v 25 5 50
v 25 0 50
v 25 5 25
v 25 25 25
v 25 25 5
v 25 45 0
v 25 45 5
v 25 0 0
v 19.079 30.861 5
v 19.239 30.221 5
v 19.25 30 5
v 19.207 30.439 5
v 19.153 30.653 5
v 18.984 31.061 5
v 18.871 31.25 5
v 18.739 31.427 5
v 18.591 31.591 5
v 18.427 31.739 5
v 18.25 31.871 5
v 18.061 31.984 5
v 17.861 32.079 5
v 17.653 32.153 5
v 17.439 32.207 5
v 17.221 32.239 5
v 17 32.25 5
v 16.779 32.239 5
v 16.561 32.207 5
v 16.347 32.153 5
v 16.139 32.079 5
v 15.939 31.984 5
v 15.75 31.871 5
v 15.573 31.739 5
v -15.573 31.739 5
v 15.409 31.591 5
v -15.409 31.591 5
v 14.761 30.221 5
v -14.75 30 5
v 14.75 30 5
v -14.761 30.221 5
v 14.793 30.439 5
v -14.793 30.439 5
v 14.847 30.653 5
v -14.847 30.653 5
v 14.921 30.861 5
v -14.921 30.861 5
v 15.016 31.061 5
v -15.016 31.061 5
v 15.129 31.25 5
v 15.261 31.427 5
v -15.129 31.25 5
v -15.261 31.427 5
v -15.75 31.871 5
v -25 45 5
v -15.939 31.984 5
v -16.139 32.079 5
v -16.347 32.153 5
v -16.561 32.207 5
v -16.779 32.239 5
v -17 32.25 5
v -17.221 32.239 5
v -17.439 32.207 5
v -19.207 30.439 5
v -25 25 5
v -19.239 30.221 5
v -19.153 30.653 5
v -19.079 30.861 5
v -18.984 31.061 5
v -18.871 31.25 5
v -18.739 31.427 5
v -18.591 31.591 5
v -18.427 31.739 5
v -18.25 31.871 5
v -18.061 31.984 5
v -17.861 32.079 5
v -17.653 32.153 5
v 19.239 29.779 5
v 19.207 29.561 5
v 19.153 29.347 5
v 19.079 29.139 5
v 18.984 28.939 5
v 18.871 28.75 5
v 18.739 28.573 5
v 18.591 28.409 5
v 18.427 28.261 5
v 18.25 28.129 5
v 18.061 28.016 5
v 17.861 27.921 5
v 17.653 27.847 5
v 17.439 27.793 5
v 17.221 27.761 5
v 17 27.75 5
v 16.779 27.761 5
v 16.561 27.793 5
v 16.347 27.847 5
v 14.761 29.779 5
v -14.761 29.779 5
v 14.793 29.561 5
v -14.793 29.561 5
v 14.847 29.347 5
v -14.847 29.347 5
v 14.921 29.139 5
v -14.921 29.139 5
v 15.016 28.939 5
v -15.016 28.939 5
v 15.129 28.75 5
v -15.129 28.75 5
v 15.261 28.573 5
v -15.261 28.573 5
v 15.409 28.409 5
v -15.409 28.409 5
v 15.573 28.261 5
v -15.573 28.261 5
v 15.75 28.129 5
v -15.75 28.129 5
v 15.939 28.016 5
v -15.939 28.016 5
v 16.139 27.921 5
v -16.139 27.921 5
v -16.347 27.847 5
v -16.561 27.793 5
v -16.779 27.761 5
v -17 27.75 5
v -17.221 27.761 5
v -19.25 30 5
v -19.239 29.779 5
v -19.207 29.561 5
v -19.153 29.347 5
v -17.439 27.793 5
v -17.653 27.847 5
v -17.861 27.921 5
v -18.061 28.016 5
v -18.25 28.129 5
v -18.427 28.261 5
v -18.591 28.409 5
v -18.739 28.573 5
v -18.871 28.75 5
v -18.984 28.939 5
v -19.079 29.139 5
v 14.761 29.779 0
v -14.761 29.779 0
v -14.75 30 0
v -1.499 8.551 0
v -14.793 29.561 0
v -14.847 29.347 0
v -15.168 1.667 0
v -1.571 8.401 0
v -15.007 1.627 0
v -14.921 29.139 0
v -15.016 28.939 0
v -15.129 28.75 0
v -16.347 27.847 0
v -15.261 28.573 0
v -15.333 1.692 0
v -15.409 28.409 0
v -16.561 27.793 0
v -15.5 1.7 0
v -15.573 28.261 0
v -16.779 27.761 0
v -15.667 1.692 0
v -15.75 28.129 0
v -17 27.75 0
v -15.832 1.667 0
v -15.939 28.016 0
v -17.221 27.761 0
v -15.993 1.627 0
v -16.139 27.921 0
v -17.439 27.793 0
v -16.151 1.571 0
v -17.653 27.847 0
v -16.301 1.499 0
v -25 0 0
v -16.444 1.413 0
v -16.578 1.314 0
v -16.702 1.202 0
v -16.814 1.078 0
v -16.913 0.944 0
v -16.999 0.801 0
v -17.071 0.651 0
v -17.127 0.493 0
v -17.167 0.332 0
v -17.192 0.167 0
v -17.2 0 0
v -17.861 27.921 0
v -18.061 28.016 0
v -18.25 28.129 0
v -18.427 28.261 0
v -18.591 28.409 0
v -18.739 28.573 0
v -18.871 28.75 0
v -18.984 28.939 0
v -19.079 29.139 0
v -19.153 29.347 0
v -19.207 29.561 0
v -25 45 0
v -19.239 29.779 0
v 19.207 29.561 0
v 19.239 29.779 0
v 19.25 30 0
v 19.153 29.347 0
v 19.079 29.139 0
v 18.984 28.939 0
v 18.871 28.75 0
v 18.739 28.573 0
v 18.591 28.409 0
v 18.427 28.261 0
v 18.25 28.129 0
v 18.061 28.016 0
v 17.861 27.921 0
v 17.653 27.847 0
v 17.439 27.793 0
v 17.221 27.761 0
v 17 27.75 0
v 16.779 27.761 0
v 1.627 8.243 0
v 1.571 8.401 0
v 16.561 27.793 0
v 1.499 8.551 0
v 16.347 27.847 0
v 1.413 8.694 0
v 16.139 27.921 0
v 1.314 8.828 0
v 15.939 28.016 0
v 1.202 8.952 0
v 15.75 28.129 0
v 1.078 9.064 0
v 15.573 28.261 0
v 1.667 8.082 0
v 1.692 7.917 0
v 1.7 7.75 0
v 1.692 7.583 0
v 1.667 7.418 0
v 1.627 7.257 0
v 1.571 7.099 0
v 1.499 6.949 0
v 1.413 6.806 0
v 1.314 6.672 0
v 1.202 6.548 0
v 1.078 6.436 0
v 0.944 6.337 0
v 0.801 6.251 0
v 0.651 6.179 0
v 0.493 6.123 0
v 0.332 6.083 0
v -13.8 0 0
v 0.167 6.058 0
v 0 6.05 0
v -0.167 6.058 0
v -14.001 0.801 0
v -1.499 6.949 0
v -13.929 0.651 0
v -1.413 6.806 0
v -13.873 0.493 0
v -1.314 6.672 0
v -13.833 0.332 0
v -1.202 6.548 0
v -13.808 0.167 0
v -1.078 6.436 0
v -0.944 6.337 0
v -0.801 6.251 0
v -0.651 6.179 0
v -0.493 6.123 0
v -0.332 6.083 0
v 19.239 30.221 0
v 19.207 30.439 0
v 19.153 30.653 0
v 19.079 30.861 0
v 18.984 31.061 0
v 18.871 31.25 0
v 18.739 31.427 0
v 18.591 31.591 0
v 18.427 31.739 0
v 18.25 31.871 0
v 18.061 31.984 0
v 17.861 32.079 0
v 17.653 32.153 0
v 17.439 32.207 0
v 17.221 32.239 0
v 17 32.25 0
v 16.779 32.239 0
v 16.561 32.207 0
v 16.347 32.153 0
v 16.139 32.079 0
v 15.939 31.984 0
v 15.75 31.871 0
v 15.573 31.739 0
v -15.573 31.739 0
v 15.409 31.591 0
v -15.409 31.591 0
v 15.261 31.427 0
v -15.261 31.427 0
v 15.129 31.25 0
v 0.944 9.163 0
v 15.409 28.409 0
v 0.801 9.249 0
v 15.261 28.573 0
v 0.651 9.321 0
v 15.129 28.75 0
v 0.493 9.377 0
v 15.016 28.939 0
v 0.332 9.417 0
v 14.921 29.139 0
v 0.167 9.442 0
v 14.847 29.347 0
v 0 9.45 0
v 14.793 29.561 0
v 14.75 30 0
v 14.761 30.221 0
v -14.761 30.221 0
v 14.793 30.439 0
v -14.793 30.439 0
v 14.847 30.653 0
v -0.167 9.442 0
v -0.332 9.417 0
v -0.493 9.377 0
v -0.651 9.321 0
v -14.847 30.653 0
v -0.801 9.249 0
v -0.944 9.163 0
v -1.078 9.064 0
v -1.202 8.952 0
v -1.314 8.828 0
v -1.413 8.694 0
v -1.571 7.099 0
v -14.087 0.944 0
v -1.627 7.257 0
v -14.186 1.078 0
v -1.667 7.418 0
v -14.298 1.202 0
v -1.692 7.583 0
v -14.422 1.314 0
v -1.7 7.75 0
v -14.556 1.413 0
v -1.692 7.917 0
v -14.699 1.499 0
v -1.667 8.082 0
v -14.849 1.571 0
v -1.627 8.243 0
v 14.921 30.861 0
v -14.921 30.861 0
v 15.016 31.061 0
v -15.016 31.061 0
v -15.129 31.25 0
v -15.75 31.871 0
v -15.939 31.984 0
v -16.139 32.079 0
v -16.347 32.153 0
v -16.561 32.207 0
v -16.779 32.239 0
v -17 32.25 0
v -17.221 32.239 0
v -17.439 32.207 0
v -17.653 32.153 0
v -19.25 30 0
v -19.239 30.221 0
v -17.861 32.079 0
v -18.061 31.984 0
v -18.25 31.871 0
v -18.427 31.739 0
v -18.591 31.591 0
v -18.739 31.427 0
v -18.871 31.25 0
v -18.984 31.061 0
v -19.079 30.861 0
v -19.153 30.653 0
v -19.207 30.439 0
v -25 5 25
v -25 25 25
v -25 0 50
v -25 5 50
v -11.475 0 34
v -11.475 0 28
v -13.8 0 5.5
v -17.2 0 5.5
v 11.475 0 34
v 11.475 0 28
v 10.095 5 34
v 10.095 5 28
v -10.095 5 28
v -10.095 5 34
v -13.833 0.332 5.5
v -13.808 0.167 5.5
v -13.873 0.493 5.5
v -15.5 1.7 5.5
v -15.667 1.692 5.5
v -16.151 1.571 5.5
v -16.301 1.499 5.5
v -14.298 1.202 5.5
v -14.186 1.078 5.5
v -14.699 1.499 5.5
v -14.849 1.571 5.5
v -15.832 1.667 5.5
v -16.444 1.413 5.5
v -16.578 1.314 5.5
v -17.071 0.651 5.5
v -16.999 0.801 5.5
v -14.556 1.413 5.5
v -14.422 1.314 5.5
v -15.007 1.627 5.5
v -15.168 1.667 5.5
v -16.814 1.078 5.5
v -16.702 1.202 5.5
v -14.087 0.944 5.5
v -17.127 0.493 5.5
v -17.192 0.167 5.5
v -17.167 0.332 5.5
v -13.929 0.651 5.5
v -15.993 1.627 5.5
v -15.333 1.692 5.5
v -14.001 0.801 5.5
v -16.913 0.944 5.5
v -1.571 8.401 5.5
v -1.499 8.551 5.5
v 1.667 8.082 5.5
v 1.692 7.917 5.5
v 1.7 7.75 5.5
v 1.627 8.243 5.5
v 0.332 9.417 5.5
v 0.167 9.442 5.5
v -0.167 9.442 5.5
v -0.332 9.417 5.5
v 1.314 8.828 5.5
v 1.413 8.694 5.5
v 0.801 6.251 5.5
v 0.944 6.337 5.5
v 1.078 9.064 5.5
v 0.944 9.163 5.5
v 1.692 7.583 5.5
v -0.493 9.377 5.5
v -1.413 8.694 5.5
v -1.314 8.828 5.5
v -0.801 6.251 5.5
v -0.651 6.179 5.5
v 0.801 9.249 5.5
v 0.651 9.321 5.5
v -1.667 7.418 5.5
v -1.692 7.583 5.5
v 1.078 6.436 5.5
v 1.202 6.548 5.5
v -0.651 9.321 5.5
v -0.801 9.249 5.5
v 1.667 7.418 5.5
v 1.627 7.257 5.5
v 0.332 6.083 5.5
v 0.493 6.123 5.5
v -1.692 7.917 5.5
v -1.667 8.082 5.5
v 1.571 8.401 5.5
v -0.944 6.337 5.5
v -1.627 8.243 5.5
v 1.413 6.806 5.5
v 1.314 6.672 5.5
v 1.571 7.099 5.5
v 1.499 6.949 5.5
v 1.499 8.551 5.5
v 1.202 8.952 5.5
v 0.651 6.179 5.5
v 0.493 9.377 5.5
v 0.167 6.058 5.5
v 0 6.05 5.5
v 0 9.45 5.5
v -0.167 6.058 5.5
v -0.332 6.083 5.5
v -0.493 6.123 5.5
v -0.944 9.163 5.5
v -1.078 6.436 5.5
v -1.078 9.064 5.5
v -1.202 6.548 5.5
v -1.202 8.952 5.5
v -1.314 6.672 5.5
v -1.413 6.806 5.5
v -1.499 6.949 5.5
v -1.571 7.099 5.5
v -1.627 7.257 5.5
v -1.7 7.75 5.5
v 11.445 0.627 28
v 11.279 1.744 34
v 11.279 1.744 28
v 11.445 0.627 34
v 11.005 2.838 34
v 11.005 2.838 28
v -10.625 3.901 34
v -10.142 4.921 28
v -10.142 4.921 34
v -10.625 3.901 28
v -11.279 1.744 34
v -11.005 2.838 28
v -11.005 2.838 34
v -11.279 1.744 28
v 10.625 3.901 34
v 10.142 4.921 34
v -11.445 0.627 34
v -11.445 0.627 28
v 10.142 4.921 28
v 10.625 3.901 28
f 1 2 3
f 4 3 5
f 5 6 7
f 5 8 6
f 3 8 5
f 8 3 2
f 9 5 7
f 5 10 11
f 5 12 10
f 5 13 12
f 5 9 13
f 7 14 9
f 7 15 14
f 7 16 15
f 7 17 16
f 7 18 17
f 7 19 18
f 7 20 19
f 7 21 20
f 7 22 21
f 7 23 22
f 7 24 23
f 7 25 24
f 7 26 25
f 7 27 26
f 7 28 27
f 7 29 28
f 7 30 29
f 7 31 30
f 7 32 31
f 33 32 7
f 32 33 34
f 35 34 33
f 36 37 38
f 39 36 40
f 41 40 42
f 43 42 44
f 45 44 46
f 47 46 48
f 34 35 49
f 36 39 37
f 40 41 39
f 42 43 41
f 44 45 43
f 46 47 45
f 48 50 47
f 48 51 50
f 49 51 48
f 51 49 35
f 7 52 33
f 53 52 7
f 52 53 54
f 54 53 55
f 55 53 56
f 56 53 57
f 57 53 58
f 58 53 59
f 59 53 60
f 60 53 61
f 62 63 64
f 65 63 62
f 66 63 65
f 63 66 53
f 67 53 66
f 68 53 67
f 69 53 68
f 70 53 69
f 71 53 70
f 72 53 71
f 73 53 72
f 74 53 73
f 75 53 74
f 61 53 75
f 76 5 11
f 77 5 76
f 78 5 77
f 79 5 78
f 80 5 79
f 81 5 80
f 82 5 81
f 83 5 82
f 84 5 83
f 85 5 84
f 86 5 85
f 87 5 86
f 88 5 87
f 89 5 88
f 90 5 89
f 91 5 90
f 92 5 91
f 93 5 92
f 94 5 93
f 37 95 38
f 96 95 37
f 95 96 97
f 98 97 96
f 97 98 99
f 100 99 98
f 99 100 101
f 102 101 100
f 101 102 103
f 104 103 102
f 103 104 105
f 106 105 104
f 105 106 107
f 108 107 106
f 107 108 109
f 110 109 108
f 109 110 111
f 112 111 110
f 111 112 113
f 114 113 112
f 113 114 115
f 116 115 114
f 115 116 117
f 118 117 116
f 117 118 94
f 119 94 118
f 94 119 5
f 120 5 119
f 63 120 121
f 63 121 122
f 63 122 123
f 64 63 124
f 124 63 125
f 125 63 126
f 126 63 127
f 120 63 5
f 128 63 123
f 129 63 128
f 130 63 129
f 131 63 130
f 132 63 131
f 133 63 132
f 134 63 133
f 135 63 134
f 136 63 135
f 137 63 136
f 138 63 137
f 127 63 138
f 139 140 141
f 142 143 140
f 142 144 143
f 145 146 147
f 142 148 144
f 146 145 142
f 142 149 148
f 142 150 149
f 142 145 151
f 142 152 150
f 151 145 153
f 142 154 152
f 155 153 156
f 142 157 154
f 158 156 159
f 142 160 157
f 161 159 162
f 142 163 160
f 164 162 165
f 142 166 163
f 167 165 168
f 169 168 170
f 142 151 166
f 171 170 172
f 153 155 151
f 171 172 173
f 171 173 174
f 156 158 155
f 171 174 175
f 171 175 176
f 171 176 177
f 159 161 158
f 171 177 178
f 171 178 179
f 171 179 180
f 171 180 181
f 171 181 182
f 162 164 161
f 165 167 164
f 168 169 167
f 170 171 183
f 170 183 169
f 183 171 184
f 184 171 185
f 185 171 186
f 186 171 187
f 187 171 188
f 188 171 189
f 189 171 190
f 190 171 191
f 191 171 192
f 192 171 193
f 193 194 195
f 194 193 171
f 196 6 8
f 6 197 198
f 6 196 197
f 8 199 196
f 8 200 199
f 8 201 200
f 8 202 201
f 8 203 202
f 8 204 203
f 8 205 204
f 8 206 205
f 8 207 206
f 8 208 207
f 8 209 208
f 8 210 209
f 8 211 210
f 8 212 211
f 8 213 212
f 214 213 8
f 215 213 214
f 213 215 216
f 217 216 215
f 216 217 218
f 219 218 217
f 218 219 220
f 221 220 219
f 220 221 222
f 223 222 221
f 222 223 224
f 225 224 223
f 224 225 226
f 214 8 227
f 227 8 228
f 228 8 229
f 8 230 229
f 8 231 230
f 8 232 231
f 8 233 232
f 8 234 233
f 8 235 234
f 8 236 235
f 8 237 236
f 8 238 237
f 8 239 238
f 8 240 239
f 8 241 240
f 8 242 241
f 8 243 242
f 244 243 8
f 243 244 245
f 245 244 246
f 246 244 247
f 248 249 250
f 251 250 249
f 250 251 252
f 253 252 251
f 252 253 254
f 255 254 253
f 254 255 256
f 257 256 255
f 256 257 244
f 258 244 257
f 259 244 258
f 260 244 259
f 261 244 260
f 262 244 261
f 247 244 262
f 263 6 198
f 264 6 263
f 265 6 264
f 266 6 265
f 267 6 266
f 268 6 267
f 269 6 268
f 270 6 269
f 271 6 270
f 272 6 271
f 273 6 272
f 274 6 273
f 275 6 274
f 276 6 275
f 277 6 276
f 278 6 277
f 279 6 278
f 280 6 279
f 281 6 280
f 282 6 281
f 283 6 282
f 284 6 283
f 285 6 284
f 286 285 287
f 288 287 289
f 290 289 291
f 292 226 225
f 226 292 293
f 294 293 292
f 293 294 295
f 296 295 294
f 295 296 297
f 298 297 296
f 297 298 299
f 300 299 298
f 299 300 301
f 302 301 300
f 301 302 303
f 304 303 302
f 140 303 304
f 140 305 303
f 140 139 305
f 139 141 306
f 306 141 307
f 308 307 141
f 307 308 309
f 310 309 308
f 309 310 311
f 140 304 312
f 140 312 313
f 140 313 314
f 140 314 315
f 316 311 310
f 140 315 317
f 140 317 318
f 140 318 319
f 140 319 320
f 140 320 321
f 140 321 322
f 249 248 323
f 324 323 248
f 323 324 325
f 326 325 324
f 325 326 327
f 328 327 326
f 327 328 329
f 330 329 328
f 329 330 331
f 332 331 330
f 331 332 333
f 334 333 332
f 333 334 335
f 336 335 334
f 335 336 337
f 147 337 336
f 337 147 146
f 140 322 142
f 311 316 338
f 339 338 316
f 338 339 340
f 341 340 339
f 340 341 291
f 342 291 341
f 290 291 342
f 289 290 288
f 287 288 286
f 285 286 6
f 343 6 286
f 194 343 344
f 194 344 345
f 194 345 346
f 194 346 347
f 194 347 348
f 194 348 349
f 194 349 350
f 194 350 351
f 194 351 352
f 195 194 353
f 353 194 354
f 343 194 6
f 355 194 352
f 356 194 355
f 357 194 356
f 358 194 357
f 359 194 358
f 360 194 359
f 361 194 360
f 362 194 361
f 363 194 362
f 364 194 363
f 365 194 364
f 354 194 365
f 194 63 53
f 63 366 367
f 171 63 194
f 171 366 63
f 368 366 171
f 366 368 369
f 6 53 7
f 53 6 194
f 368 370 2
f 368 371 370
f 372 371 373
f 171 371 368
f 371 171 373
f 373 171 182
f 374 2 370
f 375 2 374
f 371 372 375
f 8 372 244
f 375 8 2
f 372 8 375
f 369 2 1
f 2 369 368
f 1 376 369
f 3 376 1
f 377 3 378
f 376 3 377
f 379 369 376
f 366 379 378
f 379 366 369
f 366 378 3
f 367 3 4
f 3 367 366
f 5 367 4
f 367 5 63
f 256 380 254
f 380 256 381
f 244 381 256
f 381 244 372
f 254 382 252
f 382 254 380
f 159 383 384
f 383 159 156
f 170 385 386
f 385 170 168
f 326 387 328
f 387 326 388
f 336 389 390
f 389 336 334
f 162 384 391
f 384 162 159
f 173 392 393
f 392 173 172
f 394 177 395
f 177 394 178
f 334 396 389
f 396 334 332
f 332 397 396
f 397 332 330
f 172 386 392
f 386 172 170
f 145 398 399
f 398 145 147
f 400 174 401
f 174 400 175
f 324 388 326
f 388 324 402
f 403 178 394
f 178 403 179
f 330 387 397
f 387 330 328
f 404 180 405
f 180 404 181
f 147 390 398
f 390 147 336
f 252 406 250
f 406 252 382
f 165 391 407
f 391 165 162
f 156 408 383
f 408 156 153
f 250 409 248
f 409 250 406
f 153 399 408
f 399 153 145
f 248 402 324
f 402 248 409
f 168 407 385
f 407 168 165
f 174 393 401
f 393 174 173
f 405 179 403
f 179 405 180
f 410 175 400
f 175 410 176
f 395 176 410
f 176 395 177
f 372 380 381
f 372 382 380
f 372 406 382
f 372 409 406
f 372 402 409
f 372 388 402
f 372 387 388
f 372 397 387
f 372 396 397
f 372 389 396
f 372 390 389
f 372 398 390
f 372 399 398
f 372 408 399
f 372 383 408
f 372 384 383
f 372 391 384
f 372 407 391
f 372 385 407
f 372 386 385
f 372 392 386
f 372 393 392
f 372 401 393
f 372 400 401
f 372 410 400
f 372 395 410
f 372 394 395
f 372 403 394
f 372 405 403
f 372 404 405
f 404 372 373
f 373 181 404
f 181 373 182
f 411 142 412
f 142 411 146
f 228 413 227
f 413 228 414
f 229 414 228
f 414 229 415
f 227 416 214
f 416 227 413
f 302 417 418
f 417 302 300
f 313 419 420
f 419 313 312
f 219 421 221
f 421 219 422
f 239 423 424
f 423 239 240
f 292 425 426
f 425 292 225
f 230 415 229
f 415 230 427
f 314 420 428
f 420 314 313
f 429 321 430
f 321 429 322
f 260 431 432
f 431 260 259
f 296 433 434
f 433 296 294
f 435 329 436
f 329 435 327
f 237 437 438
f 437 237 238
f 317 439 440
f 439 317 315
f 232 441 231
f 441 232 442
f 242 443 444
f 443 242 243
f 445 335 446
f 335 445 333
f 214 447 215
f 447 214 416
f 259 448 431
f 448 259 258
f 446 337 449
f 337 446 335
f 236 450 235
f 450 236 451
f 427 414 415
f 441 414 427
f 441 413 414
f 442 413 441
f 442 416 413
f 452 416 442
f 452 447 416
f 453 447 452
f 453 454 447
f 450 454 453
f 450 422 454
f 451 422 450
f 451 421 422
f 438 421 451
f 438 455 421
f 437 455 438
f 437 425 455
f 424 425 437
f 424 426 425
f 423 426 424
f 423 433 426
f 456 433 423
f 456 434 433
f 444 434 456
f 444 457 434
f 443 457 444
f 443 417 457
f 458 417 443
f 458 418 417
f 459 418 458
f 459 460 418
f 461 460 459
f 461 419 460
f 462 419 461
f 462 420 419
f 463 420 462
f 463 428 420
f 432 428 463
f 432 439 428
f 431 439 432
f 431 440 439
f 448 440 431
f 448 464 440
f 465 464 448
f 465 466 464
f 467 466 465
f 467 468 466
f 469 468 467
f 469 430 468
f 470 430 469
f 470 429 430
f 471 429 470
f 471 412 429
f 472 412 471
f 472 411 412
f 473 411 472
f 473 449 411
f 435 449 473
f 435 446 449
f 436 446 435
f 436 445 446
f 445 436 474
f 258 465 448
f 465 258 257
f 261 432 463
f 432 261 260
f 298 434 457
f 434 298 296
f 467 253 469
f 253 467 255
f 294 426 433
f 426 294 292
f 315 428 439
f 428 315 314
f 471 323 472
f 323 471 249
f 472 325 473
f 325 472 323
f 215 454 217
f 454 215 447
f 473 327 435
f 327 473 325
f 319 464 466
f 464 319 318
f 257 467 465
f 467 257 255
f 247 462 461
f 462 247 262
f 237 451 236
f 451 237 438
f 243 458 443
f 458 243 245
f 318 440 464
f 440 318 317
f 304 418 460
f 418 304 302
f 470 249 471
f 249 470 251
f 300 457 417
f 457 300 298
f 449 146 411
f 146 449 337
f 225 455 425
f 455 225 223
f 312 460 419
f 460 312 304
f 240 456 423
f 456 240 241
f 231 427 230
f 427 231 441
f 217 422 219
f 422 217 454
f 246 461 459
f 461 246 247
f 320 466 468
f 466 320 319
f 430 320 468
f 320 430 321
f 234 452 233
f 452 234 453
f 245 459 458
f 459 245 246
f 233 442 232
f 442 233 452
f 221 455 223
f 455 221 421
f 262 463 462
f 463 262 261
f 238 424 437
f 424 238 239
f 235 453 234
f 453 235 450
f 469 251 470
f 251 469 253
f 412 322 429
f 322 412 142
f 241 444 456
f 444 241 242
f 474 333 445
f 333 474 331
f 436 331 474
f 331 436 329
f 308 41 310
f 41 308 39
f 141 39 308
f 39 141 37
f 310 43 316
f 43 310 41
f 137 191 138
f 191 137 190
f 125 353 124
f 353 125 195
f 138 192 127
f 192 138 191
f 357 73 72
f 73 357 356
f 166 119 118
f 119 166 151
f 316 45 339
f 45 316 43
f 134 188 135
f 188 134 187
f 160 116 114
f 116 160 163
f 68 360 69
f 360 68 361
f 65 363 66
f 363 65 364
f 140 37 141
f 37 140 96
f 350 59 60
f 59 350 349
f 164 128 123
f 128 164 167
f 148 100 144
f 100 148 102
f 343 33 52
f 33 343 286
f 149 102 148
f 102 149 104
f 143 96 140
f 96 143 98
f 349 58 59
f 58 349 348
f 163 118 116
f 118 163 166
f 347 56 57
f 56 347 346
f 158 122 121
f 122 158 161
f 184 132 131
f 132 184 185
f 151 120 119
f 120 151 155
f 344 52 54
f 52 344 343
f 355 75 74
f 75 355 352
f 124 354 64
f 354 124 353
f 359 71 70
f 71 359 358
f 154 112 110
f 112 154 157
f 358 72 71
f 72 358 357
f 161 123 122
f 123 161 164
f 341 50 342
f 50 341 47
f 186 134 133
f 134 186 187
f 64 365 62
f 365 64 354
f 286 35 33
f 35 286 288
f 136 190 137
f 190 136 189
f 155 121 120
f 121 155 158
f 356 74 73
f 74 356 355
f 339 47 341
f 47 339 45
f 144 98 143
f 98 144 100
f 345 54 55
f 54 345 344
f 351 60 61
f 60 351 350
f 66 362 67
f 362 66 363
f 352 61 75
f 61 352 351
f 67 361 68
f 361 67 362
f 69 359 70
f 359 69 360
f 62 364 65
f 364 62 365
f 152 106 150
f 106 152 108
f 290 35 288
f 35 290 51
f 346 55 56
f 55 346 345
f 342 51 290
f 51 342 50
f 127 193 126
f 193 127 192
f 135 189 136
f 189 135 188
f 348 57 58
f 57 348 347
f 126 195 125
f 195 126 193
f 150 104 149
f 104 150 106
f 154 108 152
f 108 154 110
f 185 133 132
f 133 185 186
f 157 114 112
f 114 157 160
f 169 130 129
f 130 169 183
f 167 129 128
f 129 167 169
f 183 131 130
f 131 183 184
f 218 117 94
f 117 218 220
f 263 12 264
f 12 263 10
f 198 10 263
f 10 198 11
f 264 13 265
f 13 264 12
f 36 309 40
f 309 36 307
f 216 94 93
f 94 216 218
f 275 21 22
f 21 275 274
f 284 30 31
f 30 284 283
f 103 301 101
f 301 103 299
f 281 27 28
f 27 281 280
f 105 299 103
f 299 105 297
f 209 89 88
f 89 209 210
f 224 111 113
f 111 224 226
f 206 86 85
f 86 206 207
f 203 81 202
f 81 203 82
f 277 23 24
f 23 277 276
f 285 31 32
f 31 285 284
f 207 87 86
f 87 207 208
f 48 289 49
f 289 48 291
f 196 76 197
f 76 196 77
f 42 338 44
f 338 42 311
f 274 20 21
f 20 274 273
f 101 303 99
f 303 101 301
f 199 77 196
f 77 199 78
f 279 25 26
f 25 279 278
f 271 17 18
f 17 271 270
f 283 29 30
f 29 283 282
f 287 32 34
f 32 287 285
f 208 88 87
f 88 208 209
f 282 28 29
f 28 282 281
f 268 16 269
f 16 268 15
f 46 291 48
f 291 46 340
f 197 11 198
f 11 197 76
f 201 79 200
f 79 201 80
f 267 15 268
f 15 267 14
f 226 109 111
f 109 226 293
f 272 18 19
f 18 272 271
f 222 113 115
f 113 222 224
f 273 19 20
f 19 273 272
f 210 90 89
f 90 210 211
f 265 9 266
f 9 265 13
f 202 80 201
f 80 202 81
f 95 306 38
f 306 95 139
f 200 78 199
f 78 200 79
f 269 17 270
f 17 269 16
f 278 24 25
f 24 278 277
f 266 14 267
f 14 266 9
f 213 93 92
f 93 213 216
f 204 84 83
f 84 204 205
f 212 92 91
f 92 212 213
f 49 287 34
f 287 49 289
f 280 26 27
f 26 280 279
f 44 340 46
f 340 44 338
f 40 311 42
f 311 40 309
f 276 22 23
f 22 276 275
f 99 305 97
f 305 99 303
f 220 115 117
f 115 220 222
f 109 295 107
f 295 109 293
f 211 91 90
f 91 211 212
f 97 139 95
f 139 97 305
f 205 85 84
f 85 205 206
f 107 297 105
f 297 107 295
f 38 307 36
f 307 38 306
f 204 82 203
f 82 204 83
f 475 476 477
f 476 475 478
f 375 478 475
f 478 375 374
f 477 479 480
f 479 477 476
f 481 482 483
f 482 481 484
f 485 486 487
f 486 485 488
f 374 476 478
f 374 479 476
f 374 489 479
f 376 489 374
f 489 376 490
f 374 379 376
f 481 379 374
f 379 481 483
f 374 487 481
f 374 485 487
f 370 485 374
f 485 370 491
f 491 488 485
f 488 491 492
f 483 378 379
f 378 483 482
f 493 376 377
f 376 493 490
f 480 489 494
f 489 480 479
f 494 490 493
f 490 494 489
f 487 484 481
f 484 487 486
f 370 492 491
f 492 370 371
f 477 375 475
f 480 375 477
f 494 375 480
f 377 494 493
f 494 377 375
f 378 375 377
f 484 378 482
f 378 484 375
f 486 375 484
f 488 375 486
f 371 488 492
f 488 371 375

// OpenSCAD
// L-shaped mounting bracket for NEMA 17 stepper motor (e.g. syringe pump)
// Print orientation: base plate on the bed (z = 0), vertical plate builds up along +Z

$fn = 64;

// ---------- Base plate ----------
base_x_min   = -25;   // base plate X start
base_x_max   = 25;    // base plate X end
base_y_min   = 0;     // base plate Y start
base_y_max   = 45;    // base plate Y end
base_thick   = 5;     // base plate thickness (Z)

// ---------- Vertical motor plate ----------
vert_x_min   = -25;   // motor plate X start
vert_x_max   = 25;    // motor plate X end
vert_y_min   = 0;     // motor plate Y start
vert_y_max   = 5;     // motor plate Y end (thickness)
vert_height  = 50;    // motor plate height (Z)

// ---------- Boss hole ----------
boss_d       = 23;    // motor centring boss hole diameter
boss_x       = 0;     // boss hole X centre
boss_z       = 28;    // boss hole Z centre

// ---------- Screw holes ----------
screw_d      = 3.4;   // M3 screw hole diameter
screw_pitch  = 31;    // square pattern pitch (X and Y)
screw_n      = 4;     // number of screw holes

// ---------- Gussets ----------
gusset_x1    = -25;   // left guset X start
gusset_x2    = -20;   // left guset X end
gusset_y     = 20;    // gusset leg length along +Y
gusset_z     = 20;    // gusset leg length along +Z
gusset_t     = 5;     // gusset thickness (X)

// ---------- Mounting holes ----------
hole_d       = 4.5;   // M4 vertical through-hole diameter
hole_x       = [-17, 17]; // hole X positions
hole_y       = 30;    // hole Y position

// ---------- Cut overshoot ----------
eps          = 0.5;   // extension of cutters past faces

difference() {
    union() {
        // Base plate
        translate([base_x_min, base_y_min, 0])
            cube([base_x_max - base_x_min, base_y_max - base_y_min, base_thick]);

        // Vertical motor plate
        translate([vert_x_min, vert_y_min, 0])
            cube([vert_x_max - vert_x_min, vert_y_max - vert_y_min, vert_height]);

        // Left gusset (right-angle corner at y = 5, z = 5)
        translate([gusset_x1, 5, 5])
            cube([gusset_x2 - gusset_x1, gusset_y, gusset_z]);

        // Right gusset (right-angle corner at y = 5, z = 5)
        translate([gusset_x2, 5, 5])
            cube([vert_x_max - gusset_x2, gusset_y, gusset_z]);
    }

    // Boss hole (along Y)
    translate([boss_x, vert_y_min - eps, boss_z])
        cylinder(d = boss_d, h = vert_y_max - vert_y_min + 2 * eps);

    // M3 screw holes on square pattern, centred on boss hole
    for (i = [0 : screw_n - 1])
        translate([screw_pitch * (i % 2 - 1) / 2,
                   screw_pitch * (i / 2 - 1) / 2,
                   vert_y_min - eps])
            cylinder(d = screw_d, h = vert_y_max - vert_y_min + 2 * eps);

    // M4 vertical mounting holes
    for (x = hole_x)
        translate([x, hole_y, -eps])
            cylinder(d = hole_d, h = base_thick + 2 * eps);
}
